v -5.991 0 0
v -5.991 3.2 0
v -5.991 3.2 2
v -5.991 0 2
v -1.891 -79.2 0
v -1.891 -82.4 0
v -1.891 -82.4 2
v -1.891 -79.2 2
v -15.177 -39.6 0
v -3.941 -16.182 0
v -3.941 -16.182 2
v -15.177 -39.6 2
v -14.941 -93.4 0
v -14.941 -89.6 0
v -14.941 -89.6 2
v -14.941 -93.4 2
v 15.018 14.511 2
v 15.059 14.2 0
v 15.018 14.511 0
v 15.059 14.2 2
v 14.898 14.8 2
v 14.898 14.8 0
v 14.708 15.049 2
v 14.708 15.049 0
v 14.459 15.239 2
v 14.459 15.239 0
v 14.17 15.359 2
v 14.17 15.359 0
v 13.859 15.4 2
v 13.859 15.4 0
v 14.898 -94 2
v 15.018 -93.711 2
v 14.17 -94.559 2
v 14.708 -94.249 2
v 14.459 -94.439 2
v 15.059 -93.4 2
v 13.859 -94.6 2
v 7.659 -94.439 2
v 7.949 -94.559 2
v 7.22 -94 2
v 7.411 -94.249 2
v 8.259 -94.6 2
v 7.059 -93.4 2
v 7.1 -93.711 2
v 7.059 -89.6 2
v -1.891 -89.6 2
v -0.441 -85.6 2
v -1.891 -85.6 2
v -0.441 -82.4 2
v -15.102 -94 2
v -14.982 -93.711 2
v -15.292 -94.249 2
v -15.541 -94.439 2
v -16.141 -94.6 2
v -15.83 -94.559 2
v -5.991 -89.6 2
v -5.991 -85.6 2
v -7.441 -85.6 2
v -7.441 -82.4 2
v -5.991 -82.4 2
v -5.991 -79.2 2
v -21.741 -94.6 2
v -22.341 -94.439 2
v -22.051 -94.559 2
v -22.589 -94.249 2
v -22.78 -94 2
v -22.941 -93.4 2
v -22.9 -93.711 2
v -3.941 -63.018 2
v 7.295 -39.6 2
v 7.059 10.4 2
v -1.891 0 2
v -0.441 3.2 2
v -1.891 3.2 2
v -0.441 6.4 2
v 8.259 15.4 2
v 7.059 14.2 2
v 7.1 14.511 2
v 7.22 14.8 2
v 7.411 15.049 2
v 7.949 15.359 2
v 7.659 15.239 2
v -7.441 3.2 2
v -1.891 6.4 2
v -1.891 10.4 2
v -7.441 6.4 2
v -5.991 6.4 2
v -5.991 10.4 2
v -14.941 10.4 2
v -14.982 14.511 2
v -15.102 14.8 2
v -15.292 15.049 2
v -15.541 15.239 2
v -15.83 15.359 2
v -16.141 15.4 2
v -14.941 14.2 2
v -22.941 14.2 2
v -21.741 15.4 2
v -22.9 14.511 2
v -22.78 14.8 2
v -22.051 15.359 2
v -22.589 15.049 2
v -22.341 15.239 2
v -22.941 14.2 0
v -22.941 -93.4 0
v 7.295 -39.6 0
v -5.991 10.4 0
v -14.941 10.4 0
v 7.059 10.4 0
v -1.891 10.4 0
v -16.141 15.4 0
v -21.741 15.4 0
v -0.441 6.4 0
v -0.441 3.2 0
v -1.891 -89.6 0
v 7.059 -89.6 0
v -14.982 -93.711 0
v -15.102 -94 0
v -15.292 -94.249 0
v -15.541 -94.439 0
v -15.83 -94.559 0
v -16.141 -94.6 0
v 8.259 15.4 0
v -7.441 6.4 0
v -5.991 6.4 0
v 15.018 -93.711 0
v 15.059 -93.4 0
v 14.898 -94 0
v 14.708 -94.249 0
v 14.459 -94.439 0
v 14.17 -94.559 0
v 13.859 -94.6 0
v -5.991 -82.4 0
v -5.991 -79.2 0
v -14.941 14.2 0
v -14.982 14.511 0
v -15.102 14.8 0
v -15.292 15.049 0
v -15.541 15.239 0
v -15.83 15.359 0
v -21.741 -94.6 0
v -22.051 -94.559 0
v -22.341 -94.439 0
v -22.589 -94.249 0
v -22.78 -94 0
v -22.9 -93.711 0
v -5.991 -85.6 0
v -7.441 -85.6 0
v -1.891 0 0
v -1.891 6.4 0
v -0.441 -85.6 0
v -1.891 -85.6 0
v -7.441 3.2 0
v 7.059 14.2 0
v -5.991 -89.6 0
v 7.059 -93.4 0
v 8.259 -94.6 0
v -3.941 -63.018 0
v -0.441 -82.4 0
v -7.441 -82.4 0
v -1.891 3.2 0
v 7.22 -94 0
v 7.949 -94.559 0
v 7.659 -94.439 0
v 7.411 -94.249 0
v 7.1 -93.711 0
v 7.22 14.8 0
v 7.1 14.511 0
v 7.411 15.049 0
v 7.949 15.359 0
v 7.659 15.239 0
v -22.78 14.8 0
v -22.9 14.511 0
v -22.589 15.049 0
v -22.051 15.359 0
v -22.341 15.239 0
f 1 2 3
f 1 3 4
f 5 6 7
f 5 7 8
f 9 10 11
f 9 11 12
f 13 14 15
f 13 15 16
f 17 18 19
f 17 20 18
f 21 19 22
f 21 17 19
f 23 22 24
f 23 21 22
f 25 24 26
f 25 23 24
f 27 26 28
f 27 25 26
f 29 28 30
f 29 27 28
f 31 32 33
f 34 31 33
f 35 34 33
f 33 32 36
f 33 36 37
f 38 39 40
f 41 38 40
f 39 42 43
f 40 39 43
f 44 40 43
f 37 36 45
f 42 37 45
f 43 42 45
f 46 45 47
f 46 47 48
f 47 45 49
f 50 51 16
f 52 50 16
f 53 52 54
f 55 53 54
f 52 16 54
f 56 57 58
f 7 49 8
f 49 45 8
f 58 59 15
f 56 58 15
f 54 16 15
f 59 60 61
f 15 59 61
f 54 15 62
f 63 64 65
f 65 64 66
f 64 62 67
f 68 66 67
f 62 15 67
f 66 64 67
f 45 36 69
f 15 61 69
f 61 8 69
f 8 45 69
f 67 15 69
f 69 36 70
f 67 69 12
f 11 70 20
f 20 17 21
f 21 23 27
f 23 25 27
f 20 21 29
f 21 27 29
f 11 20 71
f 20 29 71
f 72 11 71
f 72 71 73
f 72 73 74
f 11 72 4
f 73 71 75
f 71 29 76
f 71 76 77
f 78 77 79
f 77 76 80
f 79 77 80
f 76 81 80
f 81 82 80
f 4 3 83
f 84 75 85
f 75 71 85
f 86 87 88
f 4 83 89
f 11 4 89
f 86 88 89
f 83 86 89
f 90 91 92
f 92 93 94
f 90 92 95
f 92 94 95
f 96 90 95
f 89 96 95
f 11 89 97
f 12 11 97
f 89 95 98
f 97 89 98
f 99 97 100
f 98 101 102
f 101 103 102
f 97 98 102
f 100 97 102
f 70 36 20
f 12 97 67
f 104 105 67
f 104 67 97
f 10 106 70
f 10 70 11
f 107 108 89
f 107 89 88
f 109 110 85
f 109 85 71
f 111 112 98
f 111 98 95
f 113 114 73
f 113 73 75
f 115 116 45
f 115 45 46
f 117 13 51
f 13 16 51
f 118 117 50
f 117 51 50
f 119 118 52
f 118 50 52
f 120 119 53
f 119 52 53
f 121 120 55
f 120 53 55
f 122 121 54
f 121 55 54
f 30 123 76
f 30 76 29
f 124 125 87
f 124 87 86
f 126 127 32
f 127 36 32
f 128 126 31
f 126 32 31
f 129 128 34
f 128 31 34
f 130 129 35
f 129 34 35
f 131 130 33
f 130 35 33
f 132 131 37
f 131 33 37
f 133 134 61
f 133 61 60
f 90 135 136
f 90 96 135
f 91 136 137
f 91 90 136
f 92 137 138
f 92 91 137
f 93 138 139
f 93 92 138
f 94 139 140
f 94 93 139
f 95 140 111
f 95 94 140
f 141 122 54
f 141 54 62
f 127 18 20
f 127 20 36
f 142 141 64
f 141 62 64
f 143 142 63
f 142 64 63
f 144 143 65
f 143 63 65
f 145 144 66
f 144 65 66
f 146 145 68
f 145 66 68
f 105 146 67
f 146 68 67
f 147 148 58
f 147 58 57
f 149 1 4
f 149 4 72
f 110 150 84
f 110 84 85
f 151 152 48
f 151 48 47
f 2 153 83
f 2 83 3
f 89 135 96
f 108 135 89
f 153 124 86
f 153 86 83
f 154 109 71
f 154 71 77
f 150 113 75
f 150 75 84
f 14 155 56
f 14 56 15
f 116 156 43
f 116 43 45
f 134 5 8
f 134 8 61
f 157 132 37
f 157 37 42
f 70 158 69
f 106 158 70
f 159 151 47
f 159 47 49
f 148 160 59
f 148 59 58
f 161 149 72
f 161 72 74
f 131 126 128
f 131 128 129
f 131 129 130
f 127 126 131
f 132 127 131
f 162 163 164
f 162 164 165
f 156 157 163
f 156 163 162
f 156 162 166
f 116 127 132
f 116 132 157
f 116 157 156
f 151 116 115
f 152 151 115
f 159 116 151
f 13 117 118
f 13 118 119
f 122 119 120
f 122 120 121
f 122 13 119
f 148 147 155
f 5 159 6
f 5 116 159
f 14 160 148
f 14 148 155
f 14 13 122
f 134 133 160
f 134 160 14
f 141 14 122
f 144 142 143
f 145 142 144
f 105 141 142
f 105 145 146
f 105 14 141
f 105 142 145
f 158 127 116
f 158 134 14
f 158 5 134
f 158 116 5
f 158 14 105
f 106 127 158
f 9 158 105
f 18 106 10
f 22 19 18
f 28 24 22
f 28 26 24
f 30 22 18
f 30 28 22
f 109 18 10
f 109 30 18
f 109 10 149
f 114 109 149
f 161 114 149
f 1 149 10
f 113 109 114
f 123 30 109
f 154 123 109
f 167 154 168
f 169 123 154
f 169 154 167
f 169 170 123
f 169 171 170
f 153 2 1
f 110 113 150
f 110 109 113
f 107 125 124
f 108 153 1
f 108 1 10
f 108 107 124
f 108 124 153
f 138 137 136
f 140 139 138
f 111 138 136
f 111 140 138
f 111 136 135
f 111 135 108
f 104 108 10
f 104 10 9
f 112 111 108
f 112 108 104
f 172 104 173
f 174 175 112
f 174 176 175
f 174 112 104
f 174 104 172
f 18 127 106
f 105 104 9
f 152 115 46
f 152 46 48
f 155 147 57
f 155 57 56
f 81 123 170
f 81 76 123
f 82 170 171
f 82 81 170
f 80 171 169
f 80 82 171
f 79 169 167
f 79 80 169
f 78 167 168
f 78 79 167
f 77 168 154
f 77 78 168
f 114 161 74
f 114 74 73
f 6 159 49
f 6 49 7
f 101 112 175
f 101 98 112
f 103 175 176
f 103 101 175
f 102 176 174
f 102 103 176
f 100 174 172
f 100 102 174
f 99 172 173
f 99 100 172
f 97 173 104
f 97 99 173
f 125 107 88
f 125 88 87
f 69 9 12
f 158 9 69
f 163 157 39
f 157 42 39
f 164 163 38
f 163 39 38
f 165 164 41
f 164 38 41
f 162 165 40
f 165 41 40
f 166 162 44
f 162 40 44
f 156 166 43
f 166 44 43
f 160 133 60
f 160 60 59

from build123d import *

# Parameters (mm, degrees)
EXTRUDE_1_DEPTH = 2
FILLET_1_R      = 1.2


with BuildPart() as part:
    # 草图1 → 凸台-拉伸1 (new body)
    with BuildSketch(Plane.XY):
        Polygon((15.059090909, 15.4), (15.059090909, -94.6), (7.059090909, -94.6), (7.059090909, -89.6), (-1.890909091, -89.6), (-1.890909091, -85.6), (-0.440909091, -85.6), (-0.440909091, -82.4), (-1.890909091, -82.4), (-1.890909091, -79.2), (-5.990909091, -79.2), (-5.990909091, -82.4), (-7.440909091, -82.4), (-7.440909091, -85.6), (-5.990909091, -85.6), (-5.990909091, -89.6), (-14.940909091, -89.6), (-14.940909091, -94.6), (-22.940909091, -94.6), (-22.940909091, 15.4), (-14.940909091, 15.4), (-14.940909091, 10.4), (-5.990909091, 10.4), (-5.990909091, 6.4), (-7.440909091, 6.4), (-7.440909091, 3.2), (-5.990909091, 3.2), (-5.990909091, 0), (-1.890909091, 0), (-1.890909091, 3.2), (-0.440909091, 3.2), (-0.440909091, 6.4), (-1.890909091, 6.4), (-1.890909091, 10.4), (7.059090909, 10.4), (7.059090909, 15.4), align=None)
        Polygon((-3.940909091, -16.181864614), (-15.17688314, -39.6), (-3.940909091, -63.018135386), (7.295064958, -39.6), align=None, mode=Mode.SUBTRACT)
    extrude(amount=EXTRUDE_1_DEPTH)

    # 圆角1
    fillet_1_edges = [part.edges().sort_by_distance(p)[0] for p in [
        (7.059090909, 15.4, 1),
        (15.059090909, 15.4, 1),
        (15.059090909, -94.6, 1),
        (7.059090909, -94.6, 1),
        (-14.940909091, -94.6, 1),
        (-22.940909091, -94.6, 1),
        (-22.940909091, 15.4, 1),
        (-14.940909091, 15.4, 1),
    ]]
    fillet(fillet_1_edges, radius=FILLET_1_R)


solid = part.part
